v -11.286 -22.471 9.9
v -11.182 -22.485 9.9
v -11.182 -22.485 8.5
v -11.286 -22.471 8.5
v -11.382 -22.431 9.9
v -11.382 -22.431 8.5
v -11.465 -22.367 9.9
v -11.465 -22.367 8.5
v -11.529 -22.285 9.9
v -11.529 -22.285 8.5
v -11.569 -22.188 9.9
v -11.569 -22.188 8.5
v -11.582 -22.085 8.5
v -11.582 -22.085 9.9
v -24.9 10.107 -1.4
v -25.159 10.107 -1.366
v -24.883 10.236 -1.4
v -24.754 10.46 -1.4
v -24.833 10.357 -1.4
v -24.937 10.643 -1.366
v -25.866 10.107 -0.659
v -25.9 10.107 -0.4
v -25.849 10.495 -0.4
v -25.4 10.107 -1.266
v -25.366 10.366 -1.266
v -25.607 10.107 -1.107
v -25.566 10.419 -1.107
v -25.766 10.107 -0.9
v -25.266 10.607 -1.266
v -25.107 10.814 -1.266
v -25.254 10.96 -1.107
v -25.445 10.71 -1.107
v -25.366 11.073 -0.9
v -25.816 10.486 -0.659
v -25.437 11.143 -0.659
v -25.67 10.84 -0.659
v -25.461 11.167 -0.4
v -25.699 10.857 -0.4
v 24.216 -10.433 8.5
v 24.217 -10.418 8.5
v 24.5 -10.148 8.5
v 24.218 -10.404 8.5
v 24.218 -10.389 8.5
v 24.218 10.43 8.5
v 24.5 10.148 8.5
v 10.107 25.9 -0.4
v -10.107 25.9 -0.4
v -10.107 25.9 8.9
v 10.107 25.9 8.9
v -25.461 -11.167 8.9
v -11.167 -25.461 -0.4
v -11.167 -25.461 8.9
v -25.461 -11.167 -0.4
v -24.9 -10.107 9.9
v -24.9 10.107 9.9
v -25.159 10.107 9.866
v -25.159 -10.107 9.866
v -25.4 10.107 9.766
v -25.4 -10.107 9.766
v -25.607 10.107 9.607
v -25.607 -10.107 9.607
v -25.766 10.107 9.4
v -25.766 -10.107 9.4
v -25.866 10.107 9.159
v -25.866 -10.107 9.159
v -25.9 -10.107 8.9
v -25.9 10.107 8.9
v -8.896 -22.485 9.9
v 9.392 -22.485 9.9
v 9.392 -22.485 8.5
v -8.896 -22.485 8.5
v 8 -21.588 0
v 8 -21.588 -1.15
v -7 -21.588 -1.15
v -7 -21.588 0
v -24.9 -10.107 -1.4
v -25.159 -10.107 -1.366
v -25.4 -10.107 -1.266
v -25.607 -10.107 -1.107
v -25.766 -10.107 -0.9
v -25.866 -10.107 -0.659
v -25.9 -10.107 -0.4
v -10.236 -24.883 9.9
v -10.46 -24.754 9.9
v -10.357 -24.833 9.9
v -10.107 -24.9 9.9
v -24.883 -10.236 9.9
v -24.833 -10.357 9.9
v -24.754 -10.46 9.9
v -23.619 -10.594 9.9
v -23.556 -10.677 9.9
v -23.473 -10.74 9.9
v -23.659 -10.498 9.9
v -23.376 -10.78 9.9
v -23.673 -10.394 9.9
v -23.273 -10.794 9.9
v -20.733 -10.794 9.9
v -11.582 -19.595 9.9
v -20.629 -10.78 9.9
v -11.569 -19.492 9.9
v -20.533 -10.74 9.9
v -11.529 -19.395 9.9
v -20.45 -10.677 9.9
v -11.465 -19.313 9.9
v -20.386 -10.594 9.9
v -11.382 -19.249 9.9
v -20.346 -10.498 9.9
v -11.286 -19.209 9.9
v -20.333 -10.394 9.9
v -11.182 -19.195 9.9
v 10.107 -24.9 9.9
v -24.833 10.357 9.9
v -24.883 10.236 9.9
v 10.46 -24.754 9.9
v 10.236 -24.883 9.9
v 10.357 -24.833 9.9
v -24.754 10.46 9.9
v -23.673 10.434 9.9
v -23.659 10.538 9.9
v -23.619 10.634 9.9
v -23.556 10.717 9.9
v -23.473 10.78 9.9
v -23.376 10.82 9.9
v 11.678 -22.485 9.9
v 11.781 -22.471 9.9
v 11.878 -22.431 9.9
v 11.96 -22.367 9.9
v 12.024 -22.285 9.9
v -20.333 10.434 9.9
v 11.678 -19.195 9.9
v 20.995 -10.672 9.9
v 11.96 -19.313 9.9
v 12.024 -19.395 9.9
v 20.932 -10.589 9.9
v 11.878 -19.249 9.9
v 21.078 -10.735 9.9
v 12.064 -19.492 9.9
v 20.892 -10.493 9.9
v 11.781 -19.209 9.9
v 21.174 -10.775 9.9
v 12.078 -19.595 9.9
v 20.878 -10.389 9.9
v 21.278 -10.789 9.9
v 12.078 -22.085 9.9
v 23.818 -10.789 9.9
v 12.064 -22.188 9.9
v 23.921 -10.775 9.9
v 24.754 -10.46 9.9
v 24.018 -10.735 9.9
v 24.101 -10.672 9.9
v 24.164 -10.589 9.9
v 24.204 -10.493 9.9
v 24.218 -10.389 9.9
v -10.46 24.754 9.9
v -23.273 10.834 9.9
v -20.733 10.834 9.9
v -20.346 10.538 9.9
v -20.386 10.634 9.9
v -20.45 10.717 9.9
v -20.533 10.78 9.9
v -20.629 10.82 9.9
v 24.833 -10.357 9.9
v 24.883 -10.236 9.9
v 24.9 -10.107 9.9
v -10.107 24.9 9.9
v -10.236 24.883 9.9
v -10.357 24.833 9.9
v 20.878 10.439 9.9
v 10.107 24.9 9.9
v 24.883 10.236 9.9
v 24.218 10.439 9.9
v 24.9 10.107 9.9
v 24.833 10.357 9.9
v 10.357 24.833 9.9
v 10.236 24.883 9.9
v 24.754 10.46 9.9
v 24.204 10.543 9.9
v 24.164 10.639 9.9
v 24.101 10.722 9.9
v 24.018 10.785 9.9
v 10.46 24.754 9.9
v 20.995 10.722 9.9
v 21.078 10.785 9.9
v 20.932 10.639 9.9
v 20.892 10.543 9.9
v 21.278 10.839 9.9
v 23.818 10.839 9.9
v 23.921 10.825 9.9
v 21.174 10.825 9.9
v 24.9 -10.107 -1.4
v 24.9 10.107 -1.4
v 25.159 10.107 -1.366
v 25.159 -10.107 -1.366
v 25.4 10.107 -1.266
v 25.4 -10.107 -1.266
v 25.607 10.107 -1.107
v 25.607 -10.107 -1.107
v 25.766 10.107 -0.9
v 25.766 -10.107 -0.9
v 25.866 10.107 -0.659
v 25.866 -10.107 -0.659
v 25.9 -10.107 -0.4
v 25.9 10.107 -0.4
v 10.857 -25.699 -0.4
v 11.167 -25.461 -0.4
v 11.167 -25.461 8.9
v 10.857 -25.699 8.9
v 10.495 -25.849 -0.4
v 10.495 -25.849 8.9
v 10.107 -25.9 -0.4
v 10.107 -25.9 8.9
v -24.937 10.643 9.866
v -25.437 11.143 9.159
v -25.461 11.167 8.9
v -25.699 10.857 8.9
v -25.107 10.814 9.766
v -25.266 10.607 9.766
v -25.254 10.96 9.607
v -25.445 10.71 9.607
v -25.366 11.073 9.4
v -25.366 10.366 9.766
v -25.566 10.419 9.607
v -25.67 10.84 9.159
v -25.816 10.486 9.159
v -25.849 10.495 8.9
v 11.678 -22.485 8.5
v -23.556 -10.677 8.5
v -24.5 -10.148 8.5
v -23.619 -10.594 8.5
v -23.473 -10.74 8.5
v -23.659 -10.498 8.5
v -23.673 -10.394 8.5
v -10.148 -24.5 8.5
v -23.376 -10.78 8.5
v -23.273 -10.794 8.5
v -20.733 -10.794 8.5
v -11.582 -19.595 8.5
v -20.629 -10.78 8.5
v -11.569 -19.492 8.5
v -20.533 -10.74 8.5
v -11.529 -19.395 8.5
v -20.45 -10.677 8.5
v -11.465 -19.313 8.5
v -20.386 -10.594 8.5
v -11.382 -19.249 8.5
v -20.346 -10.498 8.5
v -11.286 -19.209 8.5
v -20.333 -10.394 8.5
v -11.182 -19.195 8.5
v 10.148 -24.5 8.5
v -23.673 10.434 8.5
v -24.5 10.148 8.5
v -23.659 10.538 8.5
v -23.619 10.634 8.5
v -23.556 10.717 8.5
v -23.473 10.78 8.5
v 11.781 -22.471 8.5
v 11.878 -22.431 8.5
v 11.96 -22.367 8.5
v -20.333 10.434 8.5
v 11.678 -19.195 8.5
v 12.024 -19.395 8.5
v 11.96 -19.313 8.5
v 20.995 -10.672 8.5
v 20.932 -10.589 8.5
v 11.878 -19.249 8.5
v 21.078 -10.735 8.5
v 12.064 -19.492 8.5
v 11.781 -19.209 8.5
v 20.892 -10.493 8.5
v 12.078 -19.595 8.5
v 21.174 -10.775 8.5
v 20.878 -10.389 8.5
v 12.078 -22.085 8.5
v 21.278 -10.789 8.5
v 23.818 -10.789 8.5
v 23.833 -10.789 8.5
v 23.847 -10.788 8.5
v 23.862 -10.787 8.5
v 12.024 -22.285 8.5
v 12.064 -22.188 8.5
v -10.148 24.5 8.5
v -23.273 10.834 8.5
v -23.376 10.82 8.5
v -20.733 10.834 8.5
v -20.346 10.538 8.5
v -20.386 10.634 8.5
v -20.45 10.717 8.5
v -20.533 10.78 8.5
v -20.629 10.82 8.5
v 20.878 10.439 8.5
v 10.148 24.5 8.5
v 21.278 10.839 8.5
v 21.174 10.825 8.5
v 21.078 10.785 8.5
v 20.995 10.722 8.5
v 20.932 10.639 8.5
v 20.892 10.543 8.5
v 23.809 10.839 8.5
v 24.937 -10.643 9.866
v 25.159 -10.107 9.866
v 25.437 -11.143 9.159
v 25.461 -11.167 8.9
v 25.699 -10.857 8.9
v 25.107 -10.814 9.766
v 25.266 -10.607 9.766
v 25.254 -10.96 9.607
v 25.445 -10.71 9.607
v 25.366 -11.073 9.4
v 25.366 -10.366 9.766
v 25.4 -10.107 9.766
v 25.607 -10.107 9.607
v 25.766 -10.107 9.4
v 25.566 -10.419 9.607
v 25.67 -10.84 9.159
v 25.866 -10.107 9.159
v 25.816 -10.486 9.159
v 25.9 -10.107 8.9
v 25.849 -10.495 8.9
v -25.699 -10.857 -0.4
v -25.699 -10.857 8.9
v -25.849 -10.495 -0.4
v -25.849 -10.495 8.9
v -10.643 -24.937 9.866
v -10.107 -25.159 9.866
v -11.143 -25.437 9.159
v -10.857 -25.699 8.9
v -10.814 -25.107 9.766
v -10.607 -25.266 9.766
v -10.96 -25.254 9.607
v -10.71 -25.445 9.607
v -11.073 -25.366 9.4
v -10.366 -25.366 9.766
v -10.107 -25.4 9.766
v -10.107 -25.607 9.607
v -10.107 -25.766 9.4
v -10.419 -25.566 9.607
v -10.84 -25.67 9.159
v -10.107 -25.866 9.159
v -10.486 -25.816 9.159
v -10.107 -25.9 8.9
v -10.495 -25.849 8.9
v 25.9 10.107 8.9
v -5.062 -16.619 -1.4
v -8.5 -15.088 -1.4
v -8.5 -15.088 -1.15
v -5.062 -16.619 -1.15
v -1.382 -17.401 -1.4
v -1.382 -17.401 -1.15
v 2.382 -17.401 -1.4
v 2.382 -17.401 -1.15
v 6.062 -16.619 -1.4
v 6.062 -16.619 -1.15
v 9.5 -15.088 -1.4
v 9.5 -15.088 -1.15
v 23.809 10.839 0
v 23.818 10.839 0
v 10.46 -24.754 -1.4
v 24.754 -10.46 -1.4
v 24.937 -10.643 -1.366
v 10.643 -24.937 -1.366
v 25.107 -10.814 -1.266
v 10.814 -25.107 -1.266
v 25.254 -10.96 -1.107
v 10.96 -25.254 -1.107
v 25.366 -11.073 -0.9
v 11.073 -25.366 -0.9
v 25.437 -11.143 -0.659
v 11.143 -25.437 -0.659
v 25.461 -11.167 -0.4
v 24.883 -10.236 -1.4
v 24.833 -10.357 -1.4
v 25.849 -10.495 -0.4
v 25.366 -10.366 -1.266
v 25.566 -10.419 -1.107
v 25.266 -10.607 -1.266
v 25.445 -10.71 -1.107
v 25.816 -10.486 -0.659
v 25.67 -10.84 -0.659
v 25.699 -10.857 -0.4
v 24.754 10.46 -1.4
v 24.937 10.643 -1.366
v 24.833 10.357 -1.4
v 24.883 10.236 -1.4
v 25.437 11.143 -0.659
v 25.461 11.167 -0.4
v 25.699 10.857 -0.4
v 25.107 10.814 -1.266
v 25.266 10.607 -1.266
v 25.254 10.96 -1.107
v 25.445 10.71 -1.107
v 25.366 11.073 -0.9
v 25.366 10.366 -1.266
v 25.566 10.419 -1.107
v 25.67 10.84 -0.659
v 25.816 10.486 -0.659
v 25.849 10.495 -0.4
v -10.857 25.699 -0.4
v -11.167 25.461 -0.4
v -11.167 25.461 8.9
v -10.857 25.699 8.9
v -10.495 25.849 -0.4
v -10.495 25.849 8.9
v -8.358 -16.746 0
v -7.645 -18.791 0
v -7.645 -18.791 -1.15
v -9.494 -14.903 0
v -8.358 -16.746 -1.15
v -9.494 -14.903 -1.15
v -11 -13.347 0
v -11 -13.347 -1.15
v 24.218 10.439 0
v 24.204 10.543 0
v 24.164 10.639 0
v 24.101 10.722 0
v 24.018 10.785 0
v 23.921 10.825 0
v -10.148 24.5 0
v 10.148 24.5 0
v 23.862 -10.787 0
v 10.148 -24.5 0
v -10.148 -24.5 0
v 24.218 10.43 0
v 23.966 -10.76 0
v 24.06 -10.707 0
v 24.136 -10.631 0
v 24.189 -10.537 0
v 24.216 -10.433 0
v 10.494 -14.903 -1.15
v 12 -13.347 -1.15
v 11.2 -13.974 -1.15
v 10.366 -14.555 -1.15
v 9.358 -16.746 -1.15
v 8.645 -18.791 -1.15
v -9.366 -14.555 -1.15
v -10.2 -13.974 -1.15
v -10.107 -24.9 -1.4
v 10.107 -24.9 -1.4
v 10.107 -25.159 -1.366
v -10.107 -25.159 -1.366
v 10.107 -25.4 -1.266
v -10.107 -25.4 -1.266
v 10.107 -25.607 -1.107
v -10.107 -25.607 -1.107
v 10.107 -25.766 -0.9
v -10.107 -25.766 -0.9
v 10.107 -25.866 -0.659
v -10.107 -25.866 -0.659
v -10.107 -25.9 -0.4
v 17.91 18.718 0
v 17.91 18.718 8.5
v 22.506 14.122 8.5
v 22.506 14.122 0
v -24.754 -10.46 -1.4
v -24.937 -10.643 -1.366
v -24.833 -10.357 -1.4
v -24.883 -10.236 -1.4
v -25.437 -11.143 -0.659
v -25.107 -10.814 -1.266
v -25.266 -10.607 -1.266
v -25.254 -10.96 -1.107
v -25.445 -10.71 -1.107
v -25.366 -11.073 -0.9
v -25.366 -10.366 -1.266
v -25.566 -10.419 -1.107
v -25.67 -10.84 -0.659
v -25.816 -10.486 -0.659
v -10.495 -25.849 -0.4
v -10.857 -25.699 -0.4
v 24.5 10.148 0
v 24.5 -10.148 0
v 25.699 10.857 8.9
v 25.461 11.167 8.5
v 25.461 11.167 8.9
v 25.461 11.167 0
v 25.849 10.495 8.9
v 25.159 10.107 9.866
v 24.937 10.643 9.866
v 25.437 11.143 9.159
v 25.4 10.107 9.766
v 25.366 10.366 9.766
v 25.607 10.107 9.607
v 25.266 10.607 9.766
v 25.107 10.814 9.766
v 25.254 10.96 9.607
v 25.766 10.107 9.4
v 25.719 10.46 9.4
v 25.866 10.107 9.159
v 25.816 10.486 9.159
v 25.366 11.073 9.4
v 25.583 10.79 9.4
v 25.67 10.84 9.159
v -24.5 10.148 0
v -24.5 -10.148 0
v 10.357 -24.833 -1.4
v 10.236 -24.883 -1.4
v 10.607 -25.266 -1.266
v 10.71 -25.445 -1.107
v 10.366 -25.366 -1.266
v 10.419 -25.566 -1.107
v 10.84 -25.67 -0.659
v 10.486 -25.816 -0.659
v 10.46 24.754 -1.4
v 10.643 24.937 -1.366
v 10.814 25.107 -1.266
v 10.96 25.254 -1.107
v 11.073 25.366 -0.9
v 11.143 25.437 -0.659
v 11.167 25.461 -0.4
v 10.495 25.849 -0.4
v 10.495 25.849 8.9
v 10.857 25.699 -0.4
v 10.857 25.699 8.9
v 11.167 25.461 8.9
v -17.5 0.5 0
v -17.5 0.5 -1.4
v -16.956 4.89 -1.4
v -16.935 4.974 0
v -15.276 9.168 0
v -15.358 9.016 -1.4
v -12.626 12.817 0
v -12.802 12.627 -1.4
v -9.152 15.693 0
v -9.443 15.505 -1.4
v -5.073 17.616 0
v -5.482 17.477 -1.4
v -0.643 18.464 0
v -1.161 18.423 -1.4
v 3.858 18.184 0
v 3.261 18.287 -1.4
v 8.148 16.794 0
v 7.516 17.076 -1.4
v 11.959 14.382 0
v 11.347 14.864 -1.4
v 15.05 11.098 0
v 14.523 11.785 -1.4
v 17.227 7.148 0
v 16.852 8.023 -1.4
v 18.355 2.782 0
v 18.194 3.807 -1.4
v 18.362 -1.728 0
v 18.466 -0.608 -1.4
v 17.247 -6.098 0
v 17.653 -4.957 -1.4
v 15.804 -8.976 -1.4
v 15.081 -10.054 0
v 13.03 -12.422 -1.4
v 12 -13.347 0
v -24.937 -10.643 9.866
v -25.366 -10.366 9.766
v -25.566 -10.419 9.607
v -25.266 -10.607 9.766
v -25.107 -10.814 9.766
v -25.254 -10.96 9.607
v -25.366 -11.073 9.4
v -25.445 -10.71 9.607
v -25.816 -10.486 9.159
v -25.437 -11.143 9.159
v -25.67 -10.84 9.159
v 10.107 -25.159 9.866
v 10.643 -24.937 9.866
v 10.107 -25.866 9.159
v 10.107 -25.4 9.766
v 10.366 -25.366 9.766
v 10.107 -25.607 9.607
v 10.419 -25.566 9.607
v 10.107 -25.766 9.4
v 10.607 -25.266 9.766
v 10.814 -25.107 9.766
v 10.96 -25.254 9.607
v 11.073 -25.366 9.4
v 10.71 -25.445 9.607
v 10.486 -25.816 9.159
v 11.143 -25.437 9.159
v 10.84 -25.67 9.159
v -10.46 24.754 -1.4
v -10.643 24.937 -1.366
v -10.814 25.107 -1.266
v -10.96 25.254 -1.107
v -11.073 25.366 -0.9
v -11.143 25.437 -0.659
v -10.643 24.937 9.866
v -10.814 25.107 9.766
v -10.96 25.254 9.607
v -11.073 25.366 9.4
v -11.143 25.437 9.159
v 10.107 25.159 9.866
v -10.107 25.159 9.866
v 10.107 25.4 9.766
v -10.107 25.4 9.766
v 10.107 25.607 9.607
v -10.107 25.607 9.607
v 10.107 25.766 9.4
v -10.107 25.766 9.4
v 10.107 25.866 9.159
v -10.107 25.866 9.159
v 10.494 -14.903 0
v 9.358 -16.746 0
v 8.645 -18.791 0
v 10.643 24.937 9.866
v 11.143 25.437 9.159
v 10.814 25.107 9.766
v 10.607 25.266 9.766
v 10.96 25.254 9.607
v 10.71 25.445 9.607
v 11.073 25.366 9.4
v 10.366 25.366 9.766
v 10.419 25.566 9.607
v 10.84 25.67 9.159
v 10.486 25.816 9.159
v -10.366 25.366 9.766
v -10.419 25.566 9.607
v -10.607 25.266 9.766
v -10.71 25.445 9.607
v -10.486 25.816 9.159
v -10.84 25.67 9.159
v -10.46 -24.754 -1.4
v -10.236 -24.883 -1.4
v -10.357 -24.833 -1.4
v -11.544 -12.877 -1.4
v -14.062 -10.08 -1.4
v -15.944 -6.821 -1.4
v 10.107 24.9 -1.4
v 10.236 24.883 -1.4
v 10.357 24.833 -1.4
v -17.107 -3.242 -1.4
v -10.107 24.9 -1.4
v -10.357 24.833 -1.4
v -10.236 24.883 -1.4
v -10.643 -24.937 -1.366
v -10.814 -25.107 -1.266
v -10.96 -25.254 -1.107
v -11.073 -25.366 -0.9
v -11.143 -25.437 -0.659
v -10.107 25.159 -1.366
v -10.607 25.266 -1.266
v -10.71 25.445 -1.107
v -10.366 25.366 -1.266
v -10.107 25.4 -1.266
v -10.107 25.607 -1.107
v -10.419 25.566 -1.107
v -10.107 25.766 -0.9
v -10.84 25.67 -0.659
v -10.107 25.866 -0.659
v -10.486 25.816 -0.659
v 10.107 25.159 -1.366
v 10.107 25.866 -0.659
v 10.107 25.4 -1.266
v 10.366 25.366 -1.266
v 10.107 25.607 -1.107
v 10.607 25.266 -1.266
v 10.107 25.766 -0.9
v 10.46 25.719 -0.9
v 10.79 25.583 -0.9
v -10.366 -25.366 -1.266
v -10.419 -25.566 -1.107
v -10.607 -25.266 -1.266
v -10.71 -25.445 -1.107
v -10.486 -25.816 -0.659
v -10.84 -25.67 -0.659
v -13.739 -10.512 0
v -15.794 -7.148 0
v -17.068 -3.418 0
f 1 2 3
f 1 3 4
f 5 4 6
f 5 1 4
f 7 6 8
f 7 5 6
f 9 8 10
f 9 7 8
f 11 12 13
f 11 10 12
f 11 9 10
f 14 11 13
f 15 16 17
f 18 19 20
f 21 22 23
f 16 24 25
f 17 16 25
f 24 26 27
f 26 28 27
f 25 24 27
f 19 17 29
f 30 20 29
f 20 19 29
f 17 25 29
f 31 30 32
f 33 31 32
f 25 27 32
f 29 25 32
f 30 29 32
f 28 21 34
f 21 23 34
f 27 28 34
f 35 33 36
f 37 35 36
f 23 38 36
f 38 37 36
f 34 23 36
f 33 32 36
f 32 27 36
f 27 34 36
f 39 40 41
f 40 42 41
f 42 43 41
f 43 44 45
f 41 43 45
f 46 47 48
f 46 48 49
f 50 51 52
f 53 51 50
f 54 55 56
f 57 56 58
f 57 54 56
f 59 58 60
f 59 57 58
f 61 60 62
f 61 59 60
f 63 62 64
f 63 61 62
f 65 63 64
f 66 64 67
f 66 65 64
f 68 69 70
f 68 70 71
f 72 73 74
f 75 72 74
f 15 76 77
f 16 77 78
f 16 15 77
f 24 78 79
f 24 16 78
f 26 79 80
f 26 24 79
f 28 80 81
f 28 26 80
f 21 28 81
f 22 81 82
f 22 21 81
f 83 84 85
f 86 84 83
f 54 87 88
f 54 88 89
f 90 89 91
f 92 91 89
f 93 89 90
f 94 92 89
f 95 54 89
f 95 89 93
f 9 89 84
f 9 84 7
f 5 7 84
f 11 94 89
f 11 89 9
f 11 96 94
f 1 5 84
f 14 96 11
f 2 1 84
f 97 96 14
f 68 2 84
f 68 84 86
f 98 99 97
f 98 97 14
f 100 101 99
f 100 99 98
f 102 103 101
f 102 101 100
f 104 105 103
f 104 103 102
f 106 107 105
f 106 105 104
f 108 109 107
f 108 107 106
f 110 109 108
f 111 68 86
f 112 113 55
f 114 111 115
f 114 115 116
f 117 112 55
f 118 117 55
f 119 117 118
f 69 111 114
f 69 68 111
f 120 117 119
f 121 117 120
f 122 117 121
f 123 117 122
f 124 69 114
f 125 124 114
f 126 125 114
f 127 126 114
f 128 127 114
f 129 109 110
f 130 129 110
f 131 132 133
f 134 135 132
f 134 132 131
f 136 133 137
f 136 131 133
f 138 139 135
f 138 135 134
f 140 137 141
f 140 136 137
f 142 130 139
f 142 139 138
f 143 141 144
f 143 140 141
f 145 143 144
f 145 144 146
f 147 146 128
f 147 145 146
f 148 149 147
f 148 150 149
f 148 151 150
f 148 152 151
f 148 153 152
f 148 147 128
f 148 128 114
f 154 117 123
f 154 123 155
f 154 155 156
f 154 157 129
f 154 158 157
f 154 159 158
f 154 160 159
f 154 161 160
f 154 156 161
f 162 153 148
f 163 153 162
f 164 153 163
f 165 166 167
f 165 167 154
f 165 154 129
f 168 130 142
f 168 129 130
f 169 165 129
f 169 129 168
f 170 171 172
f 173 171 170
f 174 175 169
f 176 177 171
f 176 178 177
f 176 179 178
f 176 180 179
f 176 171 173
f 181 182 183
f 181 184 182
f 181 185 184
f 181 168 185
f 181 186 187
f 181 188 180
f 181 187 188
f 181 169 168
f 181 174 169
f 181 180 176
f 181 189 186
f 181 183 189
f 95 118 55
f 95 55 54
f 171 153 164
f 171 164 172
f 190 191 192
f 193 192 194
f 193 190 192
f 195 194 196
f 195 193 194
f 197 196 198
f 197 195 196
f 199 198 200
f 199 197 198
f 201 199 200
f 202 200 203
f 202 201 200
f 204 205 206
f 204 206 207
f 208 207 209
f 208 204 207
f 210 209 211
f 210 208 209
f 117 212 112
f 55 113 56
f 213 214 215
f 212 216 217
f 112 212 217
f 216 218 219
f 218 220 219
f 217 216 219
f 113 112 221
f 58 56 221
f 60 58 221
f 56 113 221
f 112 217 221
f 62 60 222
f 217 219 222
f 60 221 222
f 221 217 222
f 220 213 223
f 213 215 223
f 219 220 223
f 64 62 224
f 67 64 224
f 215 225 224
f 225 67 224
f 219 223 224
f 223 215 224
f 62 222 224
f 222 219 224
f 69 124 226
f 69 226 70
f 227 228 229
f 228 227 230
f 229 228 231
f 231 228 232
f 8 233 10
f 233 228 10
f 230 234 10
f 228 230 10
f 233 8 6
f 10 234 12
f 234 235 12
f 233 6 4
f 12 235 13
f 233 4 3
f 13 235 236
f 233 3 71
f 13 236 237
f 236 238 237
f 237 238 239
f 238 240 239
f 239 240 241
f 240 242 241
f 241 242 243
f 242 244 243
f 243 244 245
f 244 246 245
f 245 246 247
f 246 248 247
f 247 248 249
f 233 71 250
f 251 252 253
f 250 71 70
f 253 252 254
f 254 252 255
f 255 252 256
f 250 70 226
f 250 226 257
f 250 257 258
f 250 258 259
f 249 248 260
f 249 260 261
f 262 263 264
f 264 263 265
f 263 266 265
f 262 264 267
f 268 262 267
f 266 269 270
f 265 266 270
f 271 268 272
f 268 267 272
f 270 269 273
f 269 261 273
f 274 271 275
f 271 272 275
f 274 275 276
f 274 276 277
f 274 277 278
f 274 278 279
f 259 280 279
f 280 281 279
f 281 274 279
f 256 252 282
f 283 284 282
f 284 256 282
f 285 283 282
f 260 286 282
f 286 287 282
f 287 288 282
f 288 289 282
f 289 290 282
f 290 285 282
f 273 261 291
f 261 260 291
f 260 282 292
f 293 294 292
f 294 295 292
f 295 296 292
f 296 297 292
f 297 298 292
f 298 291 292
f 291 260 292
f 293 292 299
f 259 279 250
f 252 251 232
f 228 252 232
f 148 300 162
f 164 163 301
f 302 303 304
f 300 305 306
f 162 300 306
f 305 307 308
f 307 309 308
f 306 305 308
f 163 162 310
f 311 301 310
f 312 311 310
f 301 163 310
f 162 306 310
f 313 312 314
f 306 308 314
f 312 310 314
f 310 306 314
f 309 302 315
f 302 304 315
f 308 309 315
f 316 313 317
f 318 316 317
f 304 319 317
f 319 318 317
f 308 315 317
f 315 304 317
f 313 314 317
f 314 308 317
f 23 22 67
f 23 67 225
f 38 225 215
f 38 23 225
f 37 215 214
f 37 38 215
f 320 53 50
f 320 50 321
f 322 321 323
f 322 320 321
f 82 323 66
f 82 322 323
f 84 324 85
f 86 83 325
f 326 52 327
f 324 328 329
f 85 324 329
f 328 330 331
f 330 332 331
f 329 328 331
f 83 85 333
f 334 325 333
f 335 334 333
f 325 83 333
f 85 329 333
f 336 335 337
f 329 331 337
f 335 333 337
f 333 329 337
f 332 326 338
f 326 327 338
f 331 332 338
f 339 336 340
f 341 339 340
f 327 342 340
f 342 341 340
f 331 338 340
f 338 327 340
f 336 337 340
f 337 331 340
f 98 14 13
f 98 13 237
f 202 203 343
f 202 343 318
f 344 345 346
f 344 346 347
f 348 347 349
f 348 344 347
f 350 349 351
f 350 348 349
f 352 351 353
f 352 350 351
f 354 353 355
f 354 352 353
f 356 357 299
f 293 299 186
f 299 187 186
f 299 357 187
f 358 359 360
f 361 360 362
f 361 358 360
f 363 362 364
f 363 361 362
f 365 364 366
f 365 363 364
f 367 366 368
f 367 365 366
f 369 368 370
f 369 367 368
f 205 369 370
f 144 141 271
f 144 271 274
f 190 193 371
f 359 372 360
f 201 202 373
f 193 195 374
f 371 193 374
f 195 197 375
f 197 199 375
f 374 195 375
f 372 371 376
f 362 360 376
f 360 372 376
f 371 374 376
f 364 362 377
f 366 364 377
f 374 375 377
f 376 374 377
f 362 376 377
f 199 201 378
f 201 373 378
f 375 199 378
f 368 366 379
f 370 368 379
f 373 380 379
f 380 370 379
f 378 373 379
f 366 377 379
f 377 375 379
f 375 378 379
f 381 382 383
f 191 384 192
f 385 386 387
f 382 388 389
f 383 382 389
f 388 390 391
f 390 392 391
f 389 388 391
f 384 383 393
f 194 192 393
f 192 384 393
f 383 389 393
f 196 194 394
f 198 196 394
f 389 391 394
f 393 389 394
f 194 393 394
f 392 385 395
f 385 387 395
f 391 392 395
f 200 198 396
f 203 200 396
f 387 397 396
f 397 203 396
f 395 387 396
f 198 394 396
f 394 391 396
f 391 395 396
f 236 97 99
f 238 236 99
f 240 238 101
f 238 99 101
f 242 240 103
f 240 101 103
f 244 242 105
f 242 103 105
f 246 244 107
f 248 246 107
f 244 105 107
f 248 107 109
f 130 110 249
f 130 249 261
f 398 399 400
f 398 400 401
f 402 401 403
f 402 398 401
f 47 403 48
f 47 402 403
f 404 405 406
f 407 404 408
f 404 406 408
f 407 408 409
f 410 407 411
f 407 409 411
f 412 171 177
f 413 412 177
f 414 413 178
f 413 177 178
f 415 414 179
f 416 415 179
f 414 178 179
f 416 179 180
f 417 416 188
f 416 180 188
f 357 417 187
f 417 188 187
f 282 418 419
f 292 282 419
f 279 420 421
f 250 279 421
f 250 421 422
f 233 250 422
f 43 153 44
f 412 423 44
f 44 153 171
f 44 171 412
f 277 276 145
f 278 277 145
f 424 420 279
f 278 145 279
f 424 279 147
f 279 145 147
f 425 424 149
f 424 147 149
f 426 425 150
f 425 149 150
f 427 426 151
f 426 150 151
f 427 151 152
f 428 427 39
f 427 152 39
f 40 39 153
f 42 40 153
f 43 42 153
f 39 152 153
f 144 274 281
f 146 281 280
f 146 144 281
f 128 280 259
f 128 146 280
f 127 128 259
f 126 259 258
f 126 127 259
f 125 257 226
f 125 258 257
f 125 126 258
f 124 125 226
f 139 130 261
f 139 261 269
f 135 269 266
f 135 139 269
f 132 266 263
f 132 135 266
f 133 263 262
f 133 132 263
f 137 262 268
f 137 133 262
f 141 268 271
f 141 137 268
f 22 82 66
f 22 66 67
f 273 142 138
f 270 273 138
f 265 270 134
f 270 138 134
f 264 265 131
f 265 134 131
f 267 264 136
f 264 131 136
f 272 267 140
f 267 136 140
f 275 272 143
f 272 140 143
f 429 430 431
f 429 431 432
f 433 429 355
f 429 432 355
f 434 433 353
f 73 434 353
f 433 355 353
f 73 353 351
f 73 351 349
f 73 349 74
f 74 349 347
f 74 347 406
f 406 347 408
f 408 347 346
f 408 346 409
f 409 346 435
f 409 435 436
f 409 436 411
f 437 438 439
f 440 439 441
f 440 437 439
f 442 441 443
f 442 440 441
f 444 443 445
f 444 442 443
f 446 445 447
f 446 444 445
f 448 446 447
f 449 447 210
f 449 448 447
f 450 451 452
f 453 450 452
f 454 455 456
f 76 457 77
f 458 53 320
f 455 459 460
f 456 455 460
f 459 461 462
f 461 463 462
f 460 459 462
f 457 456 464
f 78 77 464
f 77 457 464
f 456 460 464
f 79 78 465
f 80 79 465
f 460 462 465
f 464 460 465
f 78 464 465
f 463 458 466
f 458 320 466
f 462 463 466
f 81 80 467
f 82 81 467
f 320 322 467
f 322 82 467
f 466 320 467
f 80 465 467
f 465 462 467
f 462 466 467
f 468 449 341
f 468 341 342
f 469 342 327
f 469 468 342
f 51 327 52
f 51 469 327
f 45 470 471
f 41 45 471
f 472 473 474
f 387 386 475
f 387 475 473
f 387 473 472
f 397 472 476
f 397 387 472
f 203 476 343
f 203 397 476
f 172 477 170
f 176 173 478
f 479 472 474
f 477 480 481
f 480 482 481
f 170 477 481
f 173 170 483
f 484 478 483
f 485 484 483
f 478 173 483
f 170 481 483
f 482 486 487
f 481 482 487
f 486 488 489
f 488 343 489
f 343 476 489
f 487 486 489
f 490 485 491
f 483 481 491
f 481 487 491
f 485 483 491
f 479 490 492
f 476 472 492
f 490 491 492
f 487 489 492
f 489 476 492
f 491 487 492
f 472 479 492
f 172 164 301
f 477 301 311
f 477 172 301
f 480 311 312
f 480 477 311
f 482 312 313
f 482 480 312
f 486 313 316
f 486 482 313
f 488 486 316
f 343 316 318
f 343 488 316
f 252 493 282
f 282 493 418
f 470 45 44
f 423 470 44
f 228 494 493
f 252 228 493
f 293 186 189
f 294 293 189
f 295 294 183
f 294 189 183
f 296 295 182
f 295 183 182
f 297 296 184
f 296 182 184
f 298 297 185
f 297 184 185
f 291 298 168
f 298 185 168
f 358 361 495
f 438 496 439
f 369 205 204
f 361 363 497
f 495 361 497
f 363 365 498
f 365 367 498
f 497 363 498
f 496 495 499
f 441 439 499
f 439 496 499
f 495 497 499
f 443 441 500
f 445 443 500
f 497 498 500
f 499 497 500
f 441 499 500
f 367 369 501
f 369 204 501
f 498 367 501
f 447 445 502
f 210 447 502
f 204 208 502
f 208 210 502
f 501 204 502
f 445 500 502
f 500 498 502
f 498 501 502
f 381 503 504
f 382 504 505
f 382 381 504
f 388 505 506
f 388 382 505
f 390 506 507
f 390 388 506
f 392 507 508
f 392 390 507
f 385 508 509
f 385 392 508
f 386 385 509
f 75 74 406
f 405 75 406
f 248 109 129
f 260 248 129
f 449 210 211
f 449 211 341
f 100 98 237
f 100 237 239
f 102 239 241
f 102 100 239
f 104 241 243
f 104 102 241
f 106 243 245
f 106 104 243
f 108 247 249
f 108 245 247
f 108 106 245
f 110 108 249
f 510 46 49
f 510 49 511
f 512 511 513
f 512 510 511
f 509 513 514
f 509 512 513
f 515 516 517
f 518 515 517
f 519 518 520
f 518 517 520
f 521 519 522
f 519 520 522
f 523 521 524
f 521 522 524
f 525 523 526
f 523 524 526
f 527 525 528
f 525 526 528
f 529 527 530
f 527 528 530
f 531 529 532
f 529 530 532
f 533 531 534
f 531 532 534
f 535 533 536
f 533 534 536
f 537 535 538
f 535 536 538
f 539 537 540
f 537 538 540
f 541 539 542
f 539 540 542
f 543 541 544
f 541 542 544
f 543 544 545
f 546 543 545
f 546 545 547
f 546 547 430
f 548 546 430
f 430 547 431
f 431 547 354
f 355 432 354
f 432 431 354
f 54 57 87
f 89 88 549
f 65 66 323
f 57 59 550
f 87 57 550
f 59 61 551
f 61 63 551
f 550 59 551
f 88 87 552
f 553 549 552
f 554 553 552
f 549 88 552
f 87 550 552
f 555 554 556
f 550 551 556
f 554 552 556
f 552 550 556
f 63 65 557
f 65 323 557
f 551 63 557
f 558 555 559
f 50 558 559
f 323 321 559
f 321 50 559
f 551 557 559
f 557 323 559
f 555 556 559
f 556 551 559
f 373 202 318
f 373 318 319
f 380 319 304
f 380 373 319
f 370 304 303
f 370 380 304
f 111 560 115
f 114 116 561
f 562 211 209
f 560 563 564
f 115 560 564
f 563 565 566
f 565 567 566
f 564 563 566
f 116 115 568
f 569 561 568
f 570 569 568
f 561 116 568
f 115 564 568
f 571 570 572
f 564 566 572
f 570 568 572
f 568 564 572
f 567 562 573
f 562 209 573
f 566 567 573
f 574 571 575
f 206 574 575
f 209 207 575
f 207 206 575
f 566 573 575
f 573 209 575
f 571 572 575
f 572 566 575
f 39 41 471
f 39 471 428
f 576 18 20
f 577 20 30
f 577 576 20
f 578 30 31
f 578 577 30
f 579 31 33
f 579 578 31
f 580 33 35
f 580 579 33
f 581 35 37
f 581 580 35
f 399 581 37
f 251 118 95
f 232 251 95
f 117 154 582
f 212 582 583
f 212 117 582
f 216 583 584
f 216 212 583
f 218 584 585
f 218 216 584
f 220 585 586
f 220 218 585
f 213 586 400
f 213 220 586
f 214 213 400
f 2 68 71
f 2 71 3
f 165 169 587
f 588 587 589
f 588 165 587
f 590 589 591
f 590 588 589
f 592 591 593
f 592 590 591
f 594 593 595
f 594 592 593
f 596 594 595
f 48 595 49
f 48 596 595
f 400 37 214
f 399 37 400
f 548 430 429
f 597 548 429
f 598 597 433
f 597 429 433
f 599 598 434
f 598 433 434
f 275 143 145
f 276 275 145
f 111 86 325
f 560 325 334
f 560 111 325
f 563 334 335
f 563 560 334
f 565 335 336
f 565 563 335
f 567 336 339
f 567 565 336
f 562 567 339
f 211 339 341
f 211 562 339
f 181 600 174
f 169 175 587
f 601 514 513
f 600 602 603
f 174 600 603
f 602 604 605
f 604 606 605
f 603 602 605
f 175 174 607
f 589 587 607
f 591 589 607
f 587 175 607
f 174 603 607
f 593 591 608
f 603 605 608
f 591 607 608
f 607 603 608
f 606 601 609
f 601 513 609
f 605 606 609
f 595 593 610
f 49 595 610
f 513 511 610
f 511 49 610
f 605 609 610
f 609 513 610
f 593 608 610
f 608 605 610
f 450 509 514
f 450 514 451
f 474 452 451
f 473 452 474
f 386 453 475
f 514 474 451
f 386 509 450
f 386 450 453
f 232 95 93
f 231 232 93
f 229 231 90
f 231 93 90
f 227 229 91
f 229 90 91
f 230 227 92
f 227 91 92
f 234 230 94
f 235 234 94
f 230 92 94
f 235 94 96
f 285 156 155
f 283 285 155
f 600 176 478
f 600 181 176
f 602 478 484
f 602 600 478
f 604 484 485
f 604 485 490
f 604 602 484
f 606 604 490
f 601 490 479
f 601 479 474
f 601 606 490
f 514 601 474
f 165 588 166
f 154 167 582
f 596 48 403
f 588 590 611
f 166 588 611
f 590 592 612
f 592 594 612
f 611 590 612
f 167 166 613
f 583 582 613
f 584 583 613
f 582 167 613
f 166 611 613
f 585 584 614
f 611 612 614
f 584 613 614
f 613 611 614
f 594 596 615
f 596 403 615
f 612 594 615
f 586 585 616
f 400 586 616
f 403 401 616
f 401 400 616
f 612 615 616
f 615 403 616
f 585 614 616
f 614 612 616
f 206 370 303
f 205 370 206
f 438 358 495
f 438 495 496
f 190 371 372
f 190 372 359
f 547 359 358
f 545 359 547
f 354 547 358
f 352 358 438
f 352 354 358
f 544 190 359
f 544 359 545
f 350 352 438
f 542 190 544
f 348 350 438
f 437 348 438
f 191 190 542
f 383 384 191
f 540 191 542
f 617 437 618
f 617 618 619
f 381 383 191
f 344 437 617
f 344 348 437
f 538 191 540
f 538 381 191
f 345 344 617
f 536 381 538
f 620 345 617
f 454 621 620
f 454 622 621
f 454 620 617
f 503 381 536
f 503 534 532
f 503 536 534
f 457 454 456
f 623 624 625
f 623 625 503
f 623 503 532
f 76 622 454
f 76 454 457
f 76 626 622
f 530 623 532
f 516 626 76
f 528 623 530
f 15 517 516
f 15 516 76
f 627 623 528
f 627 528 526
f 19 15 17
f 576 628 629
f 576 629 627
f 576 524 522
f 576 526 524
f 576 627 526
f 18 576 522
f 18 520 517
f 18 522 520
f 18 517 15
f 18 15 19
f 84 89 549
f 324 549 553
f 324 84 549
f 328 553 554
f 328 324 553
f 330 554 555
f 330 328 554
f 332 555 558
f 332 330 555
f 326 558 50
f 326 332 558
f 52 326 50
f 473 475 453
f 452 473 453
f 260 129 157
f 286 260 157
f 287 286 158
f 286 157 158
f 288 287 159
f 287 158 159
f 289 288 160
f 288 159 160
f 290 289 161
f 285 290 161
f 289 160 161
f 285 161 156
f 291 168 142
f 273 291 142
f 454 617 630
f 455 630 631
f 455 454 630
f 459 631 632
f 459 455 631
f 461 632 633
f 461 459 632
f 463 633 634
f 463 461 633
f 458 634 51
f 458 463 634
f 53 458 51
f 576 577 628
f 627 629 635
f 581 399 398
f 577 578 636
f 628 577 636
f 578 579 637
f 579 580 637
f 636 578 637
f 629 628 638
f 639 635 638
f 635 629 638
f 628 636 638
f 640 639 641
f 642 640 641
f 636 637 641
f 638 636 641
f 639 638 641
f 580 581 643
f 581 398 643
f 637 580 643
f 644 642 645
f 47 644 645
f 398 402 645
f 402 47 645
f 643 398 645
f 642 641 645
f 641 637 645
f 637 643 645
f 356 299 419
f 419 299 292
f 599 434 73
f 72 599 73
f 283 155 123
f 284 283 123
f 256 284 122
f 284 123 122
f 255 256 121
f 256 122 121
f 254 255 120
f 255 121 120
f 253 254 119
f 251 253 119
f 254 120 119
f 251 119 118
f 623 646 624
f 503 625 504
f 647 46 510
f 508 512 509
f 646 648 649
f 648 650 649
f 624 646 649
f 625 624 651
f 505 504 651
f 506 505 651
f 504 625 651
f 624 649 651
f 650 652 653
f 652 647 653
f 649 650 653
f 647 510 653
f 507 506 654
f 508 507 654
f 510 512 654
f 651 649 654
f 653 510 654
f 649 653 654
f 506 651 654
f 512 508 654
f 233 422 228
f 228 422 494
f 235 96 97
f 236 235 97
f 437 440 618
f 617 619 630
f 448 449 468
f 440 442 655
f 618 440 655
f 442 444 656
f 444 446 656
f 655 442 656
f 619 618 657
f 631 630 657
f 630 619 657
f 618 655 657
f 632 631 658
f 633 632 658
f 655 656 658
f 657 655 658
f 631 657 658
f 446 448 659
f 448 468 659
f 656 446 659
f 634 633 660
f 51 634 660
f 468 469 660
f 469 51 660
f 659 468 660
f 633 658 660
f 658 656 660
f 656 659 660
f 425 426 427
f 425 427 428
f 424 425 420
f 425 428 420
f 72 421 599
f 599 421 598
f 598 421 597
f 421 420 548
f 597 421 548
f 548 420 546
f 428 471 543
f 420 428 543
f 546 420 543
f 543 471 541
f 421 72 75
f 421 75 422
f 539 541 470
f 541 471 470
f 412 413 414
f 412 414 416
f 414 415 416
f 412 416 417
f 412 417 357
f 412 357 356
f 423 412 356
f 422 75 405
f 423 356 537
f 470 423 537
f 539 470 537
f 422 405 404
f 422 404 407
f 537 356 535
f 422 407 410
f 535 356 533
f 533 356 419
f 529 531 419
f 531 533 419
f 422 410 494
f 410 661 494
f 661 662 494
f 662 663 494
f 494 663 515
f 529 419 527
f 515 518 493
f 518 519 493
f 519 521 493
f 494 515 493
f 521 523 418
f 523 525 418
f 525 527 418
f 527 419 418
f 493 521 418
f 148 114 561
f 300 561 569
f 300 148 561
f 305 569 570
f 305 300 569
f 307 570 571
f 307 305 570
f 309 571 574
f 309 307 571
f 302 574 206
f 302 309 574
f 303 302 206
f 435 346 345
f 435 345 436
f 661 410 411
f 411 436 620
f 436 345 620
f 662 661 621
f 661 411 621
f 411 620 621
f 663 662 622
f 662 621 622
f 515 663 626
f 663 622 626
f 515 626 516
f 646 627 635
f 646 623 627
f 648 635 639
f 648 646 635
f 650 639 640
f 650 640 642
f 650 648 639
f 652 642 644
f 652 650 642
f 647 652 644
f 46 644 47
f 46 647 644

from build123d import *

# Parameters (mm, degrees)
BOSS_EXTRUDE1_DEPTH   = 8.5
BOSS_EXTRUDE1_2_DEPTH = 8.5
BOSS_EXTRUDE1_3_DEPTH = 8.5
BOSS_EXTRUDE1_4_DEPTH = 8.5
BOSS_EXTRUDE2_DEPTH   = 1.4
BOSS_EXTRUDE3_DEPTH   = 8.5
BOSS_EXTRUDE5_DEPTH   = 1
CUT_EXTRUDE1_DEPTH    = 38.942456431
CUT_EXTRUDE2_DEPTH    = 38.942456431
FILLET1_R             = 1
BOSS_EXTRUDE6_START   = 1.4
BOSS_EXTRUDE6_DEPTH   = 1.4
FILLET2_R             = 1
CUT_EXTRUDE3_DEPTH    = 1.4
BOSS_EXTRUDE7_DEPTH   = 0.25
FILLET3_R             = 10


with BuildPart() as part:
    # Sketch1 → Boss-Extrude1 (new body)
    with BuildSketch(Plane.XY):
        with BuildLine():
            Line((25.9, -10.106810922), (25.9, 10.106810922))
            ThreePointArc((25.9, 10.106810922), (25.785819299, 10.68083607), (25.460660172, 11.167471094))
            Line((25.460660172, 11.167471094), (22.50588745, 14.122243815))
            Line((22.50588745, 14.122243815), (21.515937957, 13.132294321))
            Line((21.515937957, 13.132294321), (24.5, 10.148232278))
            Line((24.5, 10.148232278), (24.5, -10.148232278))
            Line((24.5, -10.148232278), (21.692714652, -12.955517626))
            Line((21.692714652, -12.955517626), (22.682664146, -13.94546712))
            Line((22.682664146, -13.94546712), (25.460660172, -11.167471094))
            ThreePointArc((25.460660172, -11.167471094), (25.785819299, -10.68083607), (25.9, -10.106810922))
        make_face()
    extrude(amount=BOSS_EXTRUDE1_DEPTH)



with BuildPart() as body_2:
    # Sketch1 → Boss-Extrude1 2 (new body)
    with BuildSketch(Plane.XY):
        with BuildLine():
            Line((-16.177281759, -20.450849507), (-11.167471094, -25.460660172))
            ThreePointArc((-11.167471094, -25.460660172), (-10.68083607, -25.785819299), (-10.106810922, -25.9))
            Line((-10.106810922, -25.9), (10.106810922, -25.9))
            ThreePointArc((10.106810922, -25.9), (10.68083607, -25.785819299), (11.167471094, -25.460660172))
            Line((11.167471094, -25.460660172), (15.611596334, -21.016534932))
            Line((15.611596334, -21.016534932), (14.62164684, -20.026585438))
            Line((14.62164684, -20.026585438), (10.148232278, -24.5))
            Line((10.148232278, -24.5), (-10.148232278, -24.5))
            Line((-10.148232278, -24.5), (-15.187332265, -19.460900013))
            Line((-15.187332265, -19.460900013), (-16.177281759, -20.450849507))
        make_face()
    extrude(amount=BOSS_EXTRUDE1_2_DEPTH)


with BuildPart() as body_3:
    # Sketch1 → Boss-Extrude1 3 (new body)
    with BuildSketch(Plane.XY):
        with BuildLine():
            Line((-22.116978721, 14.511152545), (-25.460660172, 11.167471094))
            ThreePointArc((-25.460660172, 11.167471094), (-25.785819299, 10.68083607), (-25.9, 10.106810922))
            Line((-25.9, 10.106810922), (-25.9, -10.106810922))
            ThreePointArc((-25.9, -10.106810922), (-25.785819299, -10.68083607), (-25.460660172, -11.167471094))
            Line((-25.460660172, -11.167471094), (-22.187689399, -14.440441867))
            Line((-22.187689399, -14.440441867), (-21.197739905, -13.450492373))
            Line((-21.197739905, -13.450492373), (-24.5, -10.148232278))
            Line((-24.5, -10.148232278), (-24.5, 10.148232278))
            Line((-24.5, 10.148232278), (-21.127029227, 13.521203051))
            Line((-21.127029227, 13.521203051), (-22.116978721, 14.511152545))
        make_face()
    extrude(amount=BOSS_EXTRUDE1_3_DEPTH)


with BuildPart() as body_4:
    # Sketch1 → Boss-Extrude1 4 (new body)
    with BuildSketch(Plane.XY):
        with BuildLine():
            Line((10.106810922, 25.9), (-10.106810922, 25.9))
            ThreePointArc((-10.106810922, 25.9), (-10.68083607, 25.785819299), (-11.167471094, 25.460660172))
            Line((-11.167471094, 25.460660172), (-17.520784643, 19.107346623))
            Line((-17.520784643, 19.107346623), (-16.530835149, 18.117397129))
            Line((-16.530835149, 18.117397129), (-10.148232278, 24.5))
            Line((-10.148232278, 24.5), (10.148232278, 24.5))
            Line((10.148232278, 24.5), (16.919743879, 17.728488399))
            Line((16.919743879, 17.728488399), (17.909693373, 18.718437893))
            Line((17.909693373, 18.718437893), (11.167471094, 25.460660172))
            ThreePointArc((11.167471094, 25.460660172), (10.68083607, 25.785819299), (10.106810922, 25.9))
        make_face()
    extrude(amount=BOSS_EXTRUDE1_4_DEPTH)


with BuildPart() as part_1:
    add(part.part)

    add(body_2.part)  # Boss-Extrude2 merges body 2

    add(body_3.part)  # Boss-Extrude2 merges body 3

    add(body_4.part)  # Boss-Extrude2 merges body 4
    # Sketch2 → Boss-Extrude2 (add)
    with BuildSketch(Plane.XY.offset(8.5)):
        with BuildLine():
            ThreePointArc((25.460660172, -11.167471094), (25.785819299, -10.68083607), (25.9, -10.106810922))
            Line((25.9, -10.106810922), (25.9, 10.106810922))
            ThreePointArc((25.9, 10.106810922), (25.785819299, 10.68083607), (25.460660172, 11.167471094))
            Line((25.460660172, 11.167471094), (11.167471094, 25.460660172))
            ThreePointArc((11.167471094, 25.460660172), (10.68083607, 25.785819299), (10.106810922, 25.9))
            Line((10.106810922, 25.9), (-10.106810922, 25.9))
            ThreePointArc((-10.106810922, 25.9), (-10.68083607, 25.785819299), (-11.167471094, 25.460660172))
            Line((-11.167471094, 25.460660172), (-25.460660172, 11.167471094))
            ThreePointArc((-25.460660172, 11.167471094), (-25.785819299, 10.68083607), (-25.9, 10.106810922))
            Line((-25.9, 10.106810922), (-25.9, -10.106810922))
            ThreePointArc((-25.9, -10.106810922), (-25.785819299, -10.68083607), (-25.460660172, -11.167471094))
            Line((-25.460660172, -11.167471094), (-11.167471094, -25.460660172))
            ThreePointArc((-11.167471094, -25.460660172), (-10.68083607, -25.785819299), (-10.106810922, -25.9))
            Line((-10.106810922, -25.9), (10.106810922, -25.9))
            ThreePointArc((10.106810922, -25.9), (10.68083607, -25.785819299), (11.167471094, -25.460660172))
            Line((11.167471094, -25.460660172), (25.460660172, -11.167471094))
        make_face()
    extrude(amount=BOSS_EXTRUDE2_DEPTH)

    # Sketch3 → Boss-Extrude3 (add)
    with BuildSketch(Plane(origin=(0, 0, 8.5), x_dir=(-1, 0, 0), z_dir=(0, 0, -1))):
        Polygon((-21.515937957, 13.132294321), (-16.919743879, 17.728488399), (-17.909693373, 18.718437893), (-22.50588745, 14.122243815), align=None)
        Polygon((21.127029227, 13.521203051), (16.530835149, 18.117397129), (17.520784643, 19.107346623), (22.116978721, 14.511152545), align=None)
        Polygon((-21.692714652, -12.955517626), (-22.682664146, -13.94546712), (-15.611596334, -21.016534932), (-14.62164684, -20.026585438), align=None)
        Polygon((15.187332265, -19.460900013), (16.177281759, -20.450849507), (22.187689399, -14.440441867), (21.197739905, -13.450492373), align=None)
    extrude(amount=BOSS_EXTRUDE3_DEPTH)

    # Sketch5 → Boss-Extrude5 (add)
    with BuildSketch(Plane(origin=(0, 0, 8.5), x_dir=(-1, 0, 0), z_dir=(0, 0, -1))):
        Polygon((16.177281759, -20.450849507), (22.187689399, -14.440441867), (21.197739905, -13.450492373), (15.187332265, -19.460900013), align=None)
    extrude(amount=BOSS_EXTRUDE5_DEPTH)

    # Sketch6 → Cut-Extrude1 (cut, through all)
    with BuildSketch(Plane.XY.offset(9.9)):
        with BuildLine():
            Line((-20.332854575, -10.39399953), (-20.332854823, 10.43400047))
            ThreePointArc((-20.332854823, 10.43400047), (-20.450012114, 10.716843181), (-20.732854828, 10.834000465))
            Line((-20.732854828, 10.834000465), (-23.272854828, 10.834000435))
            ThreePointArc((-23.272854828, 10.834000435), (-23.555697539, 10.716843144), (-23.672854823, 10.43400043))
            Line((-23.672854823, 10.43400043), (-23.672854575, -10.39399957))
            ThreePointArc((-23.672854575, -10.39399957), (-23.555697284, -10.676842281), (-23.27285457, -10.793999565))
            Line((-23.27285457, -10.793999565), (-20.73285457, -10.793999535))
            ThreePointArc((-20.73285457, -10.793999535), (-20.450011859, -10.676842244), (-20.332854575, -10.39399953))
        make_face()
        with BuildLine():
            Line((21.277947318, -10.789000444), (23.817947318, -10.789000333))
            ThreePointArc((23.817947318, -10.789000333), (24.100790025, -10.671843033), (24.217947301, -10.389000316))
            Line((24.217947301, -10.389000316), (24.21794639, 10.438999684))
            ThreePointArc((24.21794639, 10.438999684), (24.10078909, 10.721842391), (23.817946373, 10.838999667))
            Line((23.817946373, 10.838999667), (21.277946373, 10.838999556))
            ThreePointArc((21.277946373, 10.838999556), (20.995103665, 10.721842256), (20.87794639, 10.438999538))
            Line((20.87794639, 10.438999538), (20.877947301, -10.389000462))
            ThreePointArc((20.877947301, -10.389000462), (20.995104601, -10.671843169), (21.277947318, -10.789000444))
        make_face()
    extrude(amount=-CUT_EXTRUDE1_DEPTH, mode=Mode.SUBTRACT)

    # Sketch7 → Cut-Extrude2 (cut, through all)
    # profile 1 of 2: a face of its own
    with BuildSketch(Plane.XY.offset(9.9)):
        with BuildLine():
            ThreePointArc((-11.582455432, -19.595401386), (-11.465298194, -19.312558653), (-11.182455502, -19.195401316))
            Line((-11.182455502, -19.195401316), (11.677544498, -19.195397319))
            ThreePointArc((11.677544498, -19.195397319), (11.960387231, -19.312554557), (12.077544568, -19.595397249))
            Line((12.077544568, -19.595397249), (12.077545003, -22.084597249))
            ThreePointArc((12.077545003, -22.084597249), (11.960387765, -22.367439982), (11.677545073, -22.484597319))
            Line((11.677545073, -22.484597319), (9.391545073, -22.484597719))
            Line((9.391545073, -22.484597719), (-8.896454927, -22.484600916))
            Line((-8.896454927, -22.484600916), (-11.182454927, -22.484601316))
            ThreePointArc((-11.182454927, -22.484601316), (-11.46529766, -22.367444078), (-11.582454997, -22.084601386))
            Line((-11.582454997, -22.084601386), (-11.582455432, -19.595401386))
        make_face()
        Polygon((9.391545003, -22.084597719), (11.677545003, -22.084597319), (11.677544568, -19.595397319), (-11.182455432, -19.595401316), (-11.182454997, -22.084601316), (-8.896454997, -22.084600916), align=None, mode=Mode.SUBTRACT)
    # profile 2 of 2: a face of its own
    with BuildSketch(Plane.XY.offset(9.9)):
        Polygon((9.391545003, -22.084597719), (-8.896454997, -22.084600916), (-11.182454997, -22.084601316), (-11.182455432, -19.595401316), (11.677544568, -19.595397319), (11.677545003, -22.084597319), align=None)
    extrude(amount=-CUT_EXTRUDE2_DEPTH, mode=Mode.SUBTRACT)

    # Fillet1
    fillet1_edges = [part_1.edges().sort_by_distance(p)[0] for p in [
        (18.314065633, 18.314065633, 9.9),
        (10.68083607, 25.785819299, 9.9),
        (0, 25.9, 9.9),
        (-10.68083607, 25.785819299, 9.9),
        (-18.314065633, 18.314065633, 9.9),
        (-25.785819299, 10.68083607, 9.9),
        (-25.9, 0, 9.9),
        (-25.785819299, -10.68083607, 9.9),
        (-18.314065633, -18.314065633, 9.9),
        (-10.68083607, -25.785819299, 9.9),
        (0, -25.9, 9.9),
        (10.68083607, -25.785819299, 9.9),
        (18.314065633, -18.314065633, 9.9),
        (25.785819299, -10.68083607, 9.9),
        (25.9, 0, 9.9),
        (25.785819299, 10.68083607, 9.9),
    ]]
    fillet(fillet1_edges, radius=FILLET1_R)

    # Sketch8 → Boss-Extrude6 (add)
    with BuildSketch(Plane(origin=(0, 0, 0), x_dir=(-1, 0, 0), z_dir=(0, 0, -1)).offset(BOSS_EXTRUDE6_START)):
        with BuildLine():
            Line((-11.167471094, 25.460660172), (-25.460660172, 11.167471094))
            ThreePointArc((-25.460660172, 11.167471094), (-25.785819299, 10.68083607), (-25.9, 10.106810922))
            Line((-25.9, 10.106810922), (-25.9, -10.106810922))
            ThreePointArc((-25.9, -10.106810922), (-25.785819299, -10.68083607), (-25.460660172, -11.167471094))
            Line((-25.460660172, -11.167471094), (-11.167471094, -25.460660172))
            ThreePointArc((-11.167471094, -25.460660172), (-10.68083607, -25.785819299), (-10.106810922, -25.9))
            Line((-10.106810922, -25.9), (10.106810922, -25.9))
            ThreePointArc((10.106810922, -25.9), (10.68083607, -25.785819299), (11.167471094, -25.460660172))
            Line((11.167471094, -25.460660172), (25.460660172, -11.167471094))
            ThreePointArc((25.460660172, -11.167471094), (25.785819299, -10.68083607), (25.9, -10.106810922))
            Line((25.9, -10.106810922), (25.9, 10.106810922))
            ThreePointArc((25.9, 10.106810922), (25.785819299, 10.68083607), (25.460660172, 11.167471094))
            Line((25.460660172, 11.167471094), (11.167471094, 25.460660172))
            ThreePointArc((11.167471094, 25.460660172), (10.68083607, 25.785819299), (10.106810922, 25.9))
            Line((10.106810922, 25.9), (-10.106810922, 25.9))
            ThreePointArc((-10.106810922, 25.9), (-10.68083607, 25.785819299), (-11.167471094, 25.460660172))
        make_face()
    extrude(amount=-BOSS_EXTRUDE6_DEPTH)

    # Fillet2
    fillet2_edges = [part_1.edges().sort_by_distance(p)[0] for p in [
        (10.68083607, 25.785819299, -1.4),
        (18.314065633, 18.314065633, -1.4),
        (25.785819299, 10.68083607, -1.4),
        (25.9, 0, -1.4),
        (25.785819299, -10.68083607, -1.4),
        (18.314065633, -18.314065633, -1.4),
        (10.68083607, -25.785819299, -1.4),
        (0, -25.9, -1.4),
        (-10.68083607, -25.785819299, -1.4),
        (-18.314065633, -18.314065633, -1.4),
        (-25.785819299, -10.68083607, -1.4),
        (-25.9, 0, -1.4),
        (-25.785819299, 10.68083607, -1.4),
        (-18.314065633, 18.314065633, -1.4),
        (-10.68083607, 25.785819299, -1.4),
        (0, 25.9, -1.4),
    ]]
    fillet(fillet2_edges, radius=FILLET2_R)

    # Sketch9 → Cut-Extrude3 (cut)
    with BuildSketch(Plane(origin=(0, 0, -1.4), x_dir=(-1, 0, 0), z_dir=(0, 0, -1))):
        with BuildLine():
            ThreePointArc((17.5, 0.5), (-9.5, 16.088457268), (-9.5, -15.088457268))
            Line((-9.5, -15.088457268), (8.5, -15.088457268))
            ThreePointArc((8.5, -15.088457268), (15.088457268, -8.5), (17.5, 0.5))
        make_face()
        with BuildLine():
            Line((8.5, -15.088457268), (-9.5, -15.088457268))
            ThreePointArc((-9.5, -15.088457268), (-0.5, -17.5), (8.5, -15.088457268))
        make_face()
        with BuildLine():
            ThreePointArc((8.5, -15.088457268), (-0.5, -17.5), (-9.5, -15.088457268))
            Line((-9.5, -15.088457268), (-8, -21.588457268))
            Line((-8, -21.588457268), (7, -21.588457268))
            Line((7, -21.588457268), (8.5, -15.088457268))
        make_face()
    extrude(amount=-CUT_EXTRUDE3_DEPTH, mode=Mode.SUBTRACT)

    # Sketch9<3> → Boss-Extrude7 (add)
    with BuildSketch(Plane(origin=(0, 0, -1.4), x_dir=(-1, 0, 0), z_dir=(0, 0, -1))):
        with BuildLine():
            ThreePointArc((8.5, -15.088457268), (-0.5, -17.5), (-9.5, -15.088457268))
            Line((-9.5, -15.088457268), (-8, -21.588457268))
            Line((-8, -21.588457268), (7, -21.588457268))
            Line((7, -21.588457268), (8.5, -15.088457268))
        make_face()
    extrude(amount=-BOSS_EXTRUDE7_DEPTH)

    # Fillet3
    # the kernel refuses this fillet: 10 mm, written as the material it takes off along each edge
    with BuildSketch(Plane(origin=(9.5, -15.088457268, -1.15), x_dir=(0.8205991500669837, 0.5715041862570599, 0), z_dir=(0, 0, 1))) as fillet3_piece_1_section:
        with BuildLine():
            CenterArc((3.893328157, -9.964118034), FILLET3_R, 94.85518398, 37.295015249)
            Line((-2.817436219, -2.550236359), (0, 0))
            ThreePointArc((0, 0), (1.523476235, -0.064587539), (3.046952471, 0))
        make_face()
    fillet3_piece_1 = extrude(amount=10.650543516, mode=Mode.PRIVATE)
    fillet3_piece_1 = split(fillet3_piece_1, bisect_by=Plane(origin=(9.843769385, -15.549562691, 8.5), z_dir=(0, 0, -1)), keep=Keep.TOP, mode=Mode.PRIVATE)
    add(fillet3_piece_1, mode=Mode.SUBTRACT)
    with BuildSketch(Plane(origin=(-8.5, -15.088457268, -1.15), x_dir=(-0.8205991500669784, 0.5715041862570673, 0), z_dir=(0, 0, 1))) as fillet3_piece_2_section:
        with BuildLine():
            CenterArc((3.893328157, 9.964118034), FILLET3_R, 227.849800771, 37.295015249)
            Line((-2.817436219, 2.550236359), (0, 0))
            ThreePointArc((0, 0), (1.523476235, 0.064587539), (3.046952471, 0))
        make_face()
    fillet3_piece_2 = extrude(amount=10.650543516, mode=Mode.PRIVATE)
    fillet3_piece_2 = split(fillet3_piece_2, bisect_by=Plane(origin=(-8.843769385, -15.549562691, 8.5), z_dir=(0, 0, -1)), keep=Keep.TOP, mode=Mode.PRIVATE)
    add(fillet3_piece_2, mode=Mode.SUBTRACT)


solid = part_1.part
